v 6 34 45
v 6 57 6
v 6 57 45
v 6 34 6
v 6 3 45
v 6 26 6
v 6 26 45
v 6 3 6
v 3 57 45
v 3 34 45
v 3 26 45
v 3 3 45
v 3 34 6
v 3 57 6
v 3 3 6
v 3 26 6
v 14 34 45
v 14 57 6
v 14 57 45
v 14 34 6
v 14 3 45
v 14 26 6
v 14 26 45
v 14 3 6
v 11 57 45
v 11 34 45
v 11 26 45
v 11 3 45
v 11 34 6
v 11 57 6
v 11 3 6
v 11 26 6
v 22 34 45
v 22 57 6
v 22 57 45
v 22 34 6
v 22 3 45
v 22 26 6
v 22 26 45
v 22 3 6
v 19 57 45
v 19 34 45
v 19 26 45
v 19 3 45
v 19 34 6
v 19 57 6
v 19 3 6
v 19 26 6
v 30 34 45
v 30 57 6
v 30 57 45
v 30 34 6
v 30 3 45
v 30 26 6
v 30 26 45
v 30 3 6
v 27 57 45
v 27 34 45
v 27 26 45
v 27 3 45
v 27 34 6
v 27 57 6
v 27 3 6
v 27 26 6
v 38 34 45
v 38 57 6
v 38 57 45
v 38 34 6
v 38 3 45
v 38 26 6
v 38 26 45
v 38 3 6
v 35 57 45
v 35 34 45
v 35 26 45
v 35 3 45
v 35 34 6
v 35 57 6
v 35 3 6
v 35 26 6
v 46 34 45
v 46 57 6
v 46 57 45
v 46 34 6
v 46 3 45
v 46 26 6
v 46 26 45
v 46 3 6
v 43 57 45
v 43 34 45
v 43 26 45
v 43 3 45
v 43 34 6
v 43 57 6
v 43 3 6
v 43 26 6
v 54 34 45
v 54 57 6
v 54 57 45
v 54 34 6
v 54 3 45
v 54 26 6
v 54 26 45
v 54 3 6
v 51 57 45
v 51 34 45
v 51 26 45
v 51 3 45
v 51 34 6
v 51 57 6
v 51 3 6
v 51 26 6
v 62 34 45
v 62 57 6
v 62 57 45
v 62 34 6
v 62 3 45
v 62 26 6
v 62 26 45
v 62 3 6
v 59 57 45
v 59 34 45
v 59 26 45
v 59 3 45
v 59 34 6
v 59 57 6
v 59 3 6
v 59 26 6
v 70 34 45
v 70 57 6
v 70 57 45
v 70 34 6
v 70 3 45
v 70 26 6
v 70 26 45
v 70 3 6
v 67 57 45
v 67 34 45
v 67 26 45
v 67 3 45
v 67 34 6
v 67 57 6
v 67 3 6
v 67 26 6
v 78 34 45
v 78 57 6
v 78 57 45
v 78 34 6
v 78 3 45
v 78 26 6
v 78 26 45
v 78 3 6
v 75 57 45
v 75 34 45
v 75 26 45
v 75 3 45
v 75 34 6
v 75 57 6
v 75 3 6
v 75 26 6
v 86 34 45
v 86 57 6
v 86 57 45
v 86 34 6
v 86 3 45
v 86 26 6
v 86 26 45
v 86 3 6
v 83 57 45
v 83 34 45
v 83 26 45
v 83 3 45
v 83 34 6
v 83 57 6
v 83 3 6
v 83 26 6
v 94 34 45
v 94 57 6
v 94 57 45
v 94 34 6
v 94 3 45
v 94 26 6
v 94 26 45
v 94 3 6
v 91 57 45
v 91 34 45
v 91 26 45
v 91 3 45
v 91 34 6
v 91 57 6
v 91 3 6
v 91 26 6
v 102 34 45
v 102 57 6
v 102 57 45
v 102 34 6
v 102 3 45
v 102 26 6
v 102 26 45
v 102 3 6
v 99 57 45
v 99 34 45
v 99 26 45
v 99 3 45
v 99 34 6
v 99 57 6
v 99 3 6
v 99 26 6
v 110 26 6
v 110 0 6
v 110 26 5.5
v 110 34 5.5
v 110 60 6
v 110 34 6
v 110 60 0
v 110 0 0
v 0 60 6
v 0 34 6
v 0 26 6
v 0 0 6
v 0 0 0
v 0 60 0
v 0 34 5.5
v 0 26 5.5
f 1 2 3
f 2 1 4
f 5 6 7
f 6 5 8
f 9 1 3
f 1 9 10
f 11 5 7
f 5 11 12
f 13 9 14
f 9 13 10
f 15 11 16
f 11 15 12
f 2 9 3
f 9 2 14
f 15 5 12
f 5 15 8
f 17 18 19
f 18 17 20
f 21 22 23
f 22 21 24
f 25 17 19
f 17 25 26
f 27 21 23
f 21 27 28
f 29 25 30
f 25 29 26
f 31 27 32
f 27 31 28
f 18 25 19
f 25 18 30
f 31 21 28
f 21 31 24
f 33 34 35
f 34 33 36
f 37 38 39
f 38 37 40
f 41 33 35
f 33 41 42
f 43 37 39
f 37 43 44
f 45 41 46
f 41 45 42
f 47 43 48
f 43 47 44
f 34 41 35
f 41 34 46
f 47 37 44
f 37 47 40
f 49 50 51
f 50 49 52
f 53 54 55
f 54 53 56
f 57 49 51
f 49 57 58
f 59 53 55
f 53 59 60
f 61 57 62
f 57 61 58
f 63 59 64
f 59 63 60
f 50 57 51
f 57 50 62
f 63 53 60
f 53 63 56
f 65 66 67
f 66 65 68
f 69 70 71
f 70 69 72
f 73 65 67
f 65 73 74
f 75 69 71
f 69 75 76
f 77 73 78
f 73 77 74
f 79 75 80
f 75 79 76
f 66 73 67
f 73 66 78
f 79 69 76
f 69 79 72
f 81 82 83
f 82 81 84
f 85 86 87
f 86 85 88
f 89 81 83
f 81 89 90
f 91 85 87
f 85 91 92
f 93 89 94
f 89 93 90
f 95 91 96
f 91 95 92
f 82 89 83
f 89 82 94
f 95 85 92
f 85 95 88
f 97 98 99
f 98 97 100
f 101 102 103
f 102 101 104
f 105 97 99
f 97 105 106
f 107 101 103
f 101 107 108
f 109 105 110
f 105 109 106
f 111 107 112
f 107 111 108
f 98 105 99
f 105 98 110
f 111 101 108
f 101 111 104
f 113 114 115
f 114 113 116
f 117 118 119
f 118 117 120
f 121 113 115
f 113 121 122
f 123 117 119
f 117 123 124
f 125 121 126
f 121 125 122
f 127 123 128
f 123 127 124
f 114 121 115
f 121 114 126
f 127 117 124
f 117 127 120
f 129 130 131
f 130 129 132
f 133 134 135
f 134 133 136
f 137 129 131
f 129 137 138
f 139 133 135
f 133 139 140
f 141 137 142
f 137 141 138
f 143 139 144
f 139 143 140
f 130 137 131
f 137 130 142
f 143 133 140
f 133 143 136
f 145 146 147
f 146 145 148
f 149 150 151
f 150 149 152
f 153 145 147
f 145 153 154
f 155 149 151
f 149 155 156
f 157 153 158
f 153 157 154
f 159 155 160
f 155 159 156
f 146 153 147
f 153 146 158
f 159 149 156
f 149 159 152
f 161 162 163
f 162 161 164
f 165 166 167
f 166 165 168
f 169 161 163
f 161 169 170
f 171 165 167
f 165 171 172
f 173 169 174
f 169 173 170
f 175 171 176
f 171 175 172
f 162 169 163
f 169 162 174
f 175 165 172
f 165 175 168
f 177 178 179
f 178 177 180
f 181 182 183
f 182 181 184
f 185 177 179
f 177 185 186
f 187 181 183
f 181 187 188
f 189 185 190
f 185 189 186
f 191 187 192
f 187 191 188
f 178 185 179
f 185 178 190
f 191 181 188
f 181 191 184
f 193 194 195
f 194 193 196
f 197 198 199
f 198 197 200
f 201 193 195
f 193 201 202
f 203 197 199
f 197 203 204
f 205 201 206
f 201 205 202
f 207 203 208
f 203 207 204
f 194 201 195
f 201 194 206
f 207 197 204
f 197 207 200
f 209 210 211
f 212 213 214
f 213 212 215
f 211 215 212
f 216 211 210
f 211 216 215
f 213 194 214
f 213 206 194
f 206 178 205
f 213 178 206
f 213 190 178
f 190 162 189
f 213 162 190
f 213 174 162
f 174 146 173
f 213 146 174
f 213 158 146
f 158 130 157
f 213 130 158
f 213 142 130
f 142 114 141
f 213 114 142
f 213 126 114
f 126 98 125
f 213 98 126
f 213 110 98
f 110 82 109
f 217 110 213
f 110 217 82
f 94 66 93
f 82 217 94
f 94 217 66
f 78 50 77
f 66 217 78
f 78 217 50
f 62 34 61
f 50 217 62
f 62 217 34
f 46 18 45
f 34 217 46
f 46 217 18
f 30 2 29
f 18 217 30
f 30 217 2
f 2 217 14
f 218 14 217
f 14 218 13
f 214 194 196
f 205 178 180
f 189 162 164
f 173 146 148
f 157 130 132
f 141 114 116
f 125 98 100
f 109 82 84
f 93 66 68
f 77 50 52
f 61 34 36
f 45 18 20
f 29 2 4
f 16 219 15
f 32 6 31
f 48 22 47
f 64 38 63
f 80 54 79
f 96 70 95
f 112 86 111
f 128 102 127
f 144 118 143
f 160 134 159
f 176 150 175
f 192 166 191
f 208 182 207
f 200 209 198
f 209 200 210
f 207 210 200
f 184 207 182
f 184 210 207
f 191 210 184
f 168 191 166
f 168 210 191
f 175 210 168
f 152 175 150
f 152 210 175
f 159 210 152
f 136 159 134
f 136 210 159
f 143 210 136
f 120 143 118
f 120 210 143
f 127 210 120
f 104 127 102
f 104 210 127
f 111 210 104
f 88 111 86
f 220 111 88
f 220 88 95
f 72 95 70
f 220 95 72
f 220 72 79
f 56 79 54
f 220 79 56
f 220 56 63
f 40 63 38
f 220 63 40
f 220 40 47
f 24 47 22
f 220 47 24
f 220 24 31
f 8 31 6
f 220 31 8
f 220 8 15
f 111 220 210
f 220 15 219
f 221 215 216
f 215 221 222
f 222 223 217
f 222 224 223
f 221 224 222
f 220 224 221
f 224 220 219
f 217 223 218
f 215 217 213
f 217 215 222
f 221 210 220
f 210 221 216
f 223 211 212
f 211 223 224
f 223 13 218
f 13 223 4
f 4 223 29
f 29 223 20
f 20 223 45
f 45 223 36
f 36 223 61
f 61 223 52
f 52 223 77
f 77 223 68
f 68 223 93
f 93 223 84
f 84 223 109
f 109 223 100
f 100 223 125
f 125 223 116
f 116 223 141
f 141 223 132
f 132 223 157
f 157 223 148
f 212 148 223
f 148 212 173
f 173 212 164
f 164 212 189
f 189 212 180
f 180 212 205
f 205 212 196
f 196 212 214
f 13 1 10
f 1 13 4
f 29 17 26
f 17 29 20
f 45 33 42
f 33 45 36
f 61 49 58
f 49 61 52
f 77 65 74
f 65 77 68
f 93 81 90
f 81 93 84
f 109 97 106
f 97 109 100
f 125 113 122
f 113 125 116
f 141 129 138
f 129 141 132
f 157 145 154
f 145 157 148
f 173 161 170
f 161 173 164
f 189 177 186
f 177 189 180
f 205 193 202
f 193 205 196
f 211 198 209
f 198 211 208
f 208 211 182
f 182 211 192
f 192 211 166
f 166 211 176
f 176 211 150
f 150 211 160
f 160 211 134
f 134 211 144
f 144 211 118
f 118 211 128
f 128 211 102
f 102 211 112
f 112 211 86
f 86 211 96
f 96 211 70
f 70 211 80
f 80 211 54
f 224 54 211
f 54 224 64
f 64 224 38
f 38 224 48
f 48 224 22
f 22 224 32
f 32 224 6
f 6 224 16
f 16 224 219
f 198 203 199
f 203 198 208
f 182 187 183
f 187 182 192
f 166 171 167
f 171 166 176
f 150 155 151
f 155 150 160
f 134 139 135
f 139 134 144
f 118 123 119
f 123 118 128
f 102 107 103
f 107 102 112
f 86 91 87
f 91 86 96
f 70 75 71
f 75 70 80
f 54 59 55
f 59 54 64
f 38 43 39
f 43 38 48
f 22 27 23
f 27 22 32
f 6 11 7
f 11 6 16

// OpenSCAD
$fn = 32;

// ----------------------------------------------------------------------
// Heatsink: slotted fin block
// ----------------------------------------------------------------------

// --- parameters (mm) ---
base_l = 110;             // base length, X
base_w = 60;              // base width, Y
base_t = 6;               // base plate thickness
fin_h = 40;               // fin height above the base
fin_t = 3;                // fin thickness
edge = 3;                 // margin from the base ends
pitch = 8;                // fin pitch
slot_w = 8;               // central slot width, Y

n_fins = floor((base_l - 2 * edge - fin_t) / pitch) + 1;  // fin count
total_h = base_t + fin_h - 1;  // overall height

difference() {
union() {
  cube([base_l, base_w, base_t]);
  for (i = [0 : n_fins - 1])
    translate([edge + i * pitch, edge, base_t - 1])
      cube([fin_t, base_w - 2 * edge, fin_h]);
}
  translate([-1, base_w / 2 - slot_w / 2, base_t - 0.5])
    cube([base_l + 2, slot_w, fin_h + 2]);
}
